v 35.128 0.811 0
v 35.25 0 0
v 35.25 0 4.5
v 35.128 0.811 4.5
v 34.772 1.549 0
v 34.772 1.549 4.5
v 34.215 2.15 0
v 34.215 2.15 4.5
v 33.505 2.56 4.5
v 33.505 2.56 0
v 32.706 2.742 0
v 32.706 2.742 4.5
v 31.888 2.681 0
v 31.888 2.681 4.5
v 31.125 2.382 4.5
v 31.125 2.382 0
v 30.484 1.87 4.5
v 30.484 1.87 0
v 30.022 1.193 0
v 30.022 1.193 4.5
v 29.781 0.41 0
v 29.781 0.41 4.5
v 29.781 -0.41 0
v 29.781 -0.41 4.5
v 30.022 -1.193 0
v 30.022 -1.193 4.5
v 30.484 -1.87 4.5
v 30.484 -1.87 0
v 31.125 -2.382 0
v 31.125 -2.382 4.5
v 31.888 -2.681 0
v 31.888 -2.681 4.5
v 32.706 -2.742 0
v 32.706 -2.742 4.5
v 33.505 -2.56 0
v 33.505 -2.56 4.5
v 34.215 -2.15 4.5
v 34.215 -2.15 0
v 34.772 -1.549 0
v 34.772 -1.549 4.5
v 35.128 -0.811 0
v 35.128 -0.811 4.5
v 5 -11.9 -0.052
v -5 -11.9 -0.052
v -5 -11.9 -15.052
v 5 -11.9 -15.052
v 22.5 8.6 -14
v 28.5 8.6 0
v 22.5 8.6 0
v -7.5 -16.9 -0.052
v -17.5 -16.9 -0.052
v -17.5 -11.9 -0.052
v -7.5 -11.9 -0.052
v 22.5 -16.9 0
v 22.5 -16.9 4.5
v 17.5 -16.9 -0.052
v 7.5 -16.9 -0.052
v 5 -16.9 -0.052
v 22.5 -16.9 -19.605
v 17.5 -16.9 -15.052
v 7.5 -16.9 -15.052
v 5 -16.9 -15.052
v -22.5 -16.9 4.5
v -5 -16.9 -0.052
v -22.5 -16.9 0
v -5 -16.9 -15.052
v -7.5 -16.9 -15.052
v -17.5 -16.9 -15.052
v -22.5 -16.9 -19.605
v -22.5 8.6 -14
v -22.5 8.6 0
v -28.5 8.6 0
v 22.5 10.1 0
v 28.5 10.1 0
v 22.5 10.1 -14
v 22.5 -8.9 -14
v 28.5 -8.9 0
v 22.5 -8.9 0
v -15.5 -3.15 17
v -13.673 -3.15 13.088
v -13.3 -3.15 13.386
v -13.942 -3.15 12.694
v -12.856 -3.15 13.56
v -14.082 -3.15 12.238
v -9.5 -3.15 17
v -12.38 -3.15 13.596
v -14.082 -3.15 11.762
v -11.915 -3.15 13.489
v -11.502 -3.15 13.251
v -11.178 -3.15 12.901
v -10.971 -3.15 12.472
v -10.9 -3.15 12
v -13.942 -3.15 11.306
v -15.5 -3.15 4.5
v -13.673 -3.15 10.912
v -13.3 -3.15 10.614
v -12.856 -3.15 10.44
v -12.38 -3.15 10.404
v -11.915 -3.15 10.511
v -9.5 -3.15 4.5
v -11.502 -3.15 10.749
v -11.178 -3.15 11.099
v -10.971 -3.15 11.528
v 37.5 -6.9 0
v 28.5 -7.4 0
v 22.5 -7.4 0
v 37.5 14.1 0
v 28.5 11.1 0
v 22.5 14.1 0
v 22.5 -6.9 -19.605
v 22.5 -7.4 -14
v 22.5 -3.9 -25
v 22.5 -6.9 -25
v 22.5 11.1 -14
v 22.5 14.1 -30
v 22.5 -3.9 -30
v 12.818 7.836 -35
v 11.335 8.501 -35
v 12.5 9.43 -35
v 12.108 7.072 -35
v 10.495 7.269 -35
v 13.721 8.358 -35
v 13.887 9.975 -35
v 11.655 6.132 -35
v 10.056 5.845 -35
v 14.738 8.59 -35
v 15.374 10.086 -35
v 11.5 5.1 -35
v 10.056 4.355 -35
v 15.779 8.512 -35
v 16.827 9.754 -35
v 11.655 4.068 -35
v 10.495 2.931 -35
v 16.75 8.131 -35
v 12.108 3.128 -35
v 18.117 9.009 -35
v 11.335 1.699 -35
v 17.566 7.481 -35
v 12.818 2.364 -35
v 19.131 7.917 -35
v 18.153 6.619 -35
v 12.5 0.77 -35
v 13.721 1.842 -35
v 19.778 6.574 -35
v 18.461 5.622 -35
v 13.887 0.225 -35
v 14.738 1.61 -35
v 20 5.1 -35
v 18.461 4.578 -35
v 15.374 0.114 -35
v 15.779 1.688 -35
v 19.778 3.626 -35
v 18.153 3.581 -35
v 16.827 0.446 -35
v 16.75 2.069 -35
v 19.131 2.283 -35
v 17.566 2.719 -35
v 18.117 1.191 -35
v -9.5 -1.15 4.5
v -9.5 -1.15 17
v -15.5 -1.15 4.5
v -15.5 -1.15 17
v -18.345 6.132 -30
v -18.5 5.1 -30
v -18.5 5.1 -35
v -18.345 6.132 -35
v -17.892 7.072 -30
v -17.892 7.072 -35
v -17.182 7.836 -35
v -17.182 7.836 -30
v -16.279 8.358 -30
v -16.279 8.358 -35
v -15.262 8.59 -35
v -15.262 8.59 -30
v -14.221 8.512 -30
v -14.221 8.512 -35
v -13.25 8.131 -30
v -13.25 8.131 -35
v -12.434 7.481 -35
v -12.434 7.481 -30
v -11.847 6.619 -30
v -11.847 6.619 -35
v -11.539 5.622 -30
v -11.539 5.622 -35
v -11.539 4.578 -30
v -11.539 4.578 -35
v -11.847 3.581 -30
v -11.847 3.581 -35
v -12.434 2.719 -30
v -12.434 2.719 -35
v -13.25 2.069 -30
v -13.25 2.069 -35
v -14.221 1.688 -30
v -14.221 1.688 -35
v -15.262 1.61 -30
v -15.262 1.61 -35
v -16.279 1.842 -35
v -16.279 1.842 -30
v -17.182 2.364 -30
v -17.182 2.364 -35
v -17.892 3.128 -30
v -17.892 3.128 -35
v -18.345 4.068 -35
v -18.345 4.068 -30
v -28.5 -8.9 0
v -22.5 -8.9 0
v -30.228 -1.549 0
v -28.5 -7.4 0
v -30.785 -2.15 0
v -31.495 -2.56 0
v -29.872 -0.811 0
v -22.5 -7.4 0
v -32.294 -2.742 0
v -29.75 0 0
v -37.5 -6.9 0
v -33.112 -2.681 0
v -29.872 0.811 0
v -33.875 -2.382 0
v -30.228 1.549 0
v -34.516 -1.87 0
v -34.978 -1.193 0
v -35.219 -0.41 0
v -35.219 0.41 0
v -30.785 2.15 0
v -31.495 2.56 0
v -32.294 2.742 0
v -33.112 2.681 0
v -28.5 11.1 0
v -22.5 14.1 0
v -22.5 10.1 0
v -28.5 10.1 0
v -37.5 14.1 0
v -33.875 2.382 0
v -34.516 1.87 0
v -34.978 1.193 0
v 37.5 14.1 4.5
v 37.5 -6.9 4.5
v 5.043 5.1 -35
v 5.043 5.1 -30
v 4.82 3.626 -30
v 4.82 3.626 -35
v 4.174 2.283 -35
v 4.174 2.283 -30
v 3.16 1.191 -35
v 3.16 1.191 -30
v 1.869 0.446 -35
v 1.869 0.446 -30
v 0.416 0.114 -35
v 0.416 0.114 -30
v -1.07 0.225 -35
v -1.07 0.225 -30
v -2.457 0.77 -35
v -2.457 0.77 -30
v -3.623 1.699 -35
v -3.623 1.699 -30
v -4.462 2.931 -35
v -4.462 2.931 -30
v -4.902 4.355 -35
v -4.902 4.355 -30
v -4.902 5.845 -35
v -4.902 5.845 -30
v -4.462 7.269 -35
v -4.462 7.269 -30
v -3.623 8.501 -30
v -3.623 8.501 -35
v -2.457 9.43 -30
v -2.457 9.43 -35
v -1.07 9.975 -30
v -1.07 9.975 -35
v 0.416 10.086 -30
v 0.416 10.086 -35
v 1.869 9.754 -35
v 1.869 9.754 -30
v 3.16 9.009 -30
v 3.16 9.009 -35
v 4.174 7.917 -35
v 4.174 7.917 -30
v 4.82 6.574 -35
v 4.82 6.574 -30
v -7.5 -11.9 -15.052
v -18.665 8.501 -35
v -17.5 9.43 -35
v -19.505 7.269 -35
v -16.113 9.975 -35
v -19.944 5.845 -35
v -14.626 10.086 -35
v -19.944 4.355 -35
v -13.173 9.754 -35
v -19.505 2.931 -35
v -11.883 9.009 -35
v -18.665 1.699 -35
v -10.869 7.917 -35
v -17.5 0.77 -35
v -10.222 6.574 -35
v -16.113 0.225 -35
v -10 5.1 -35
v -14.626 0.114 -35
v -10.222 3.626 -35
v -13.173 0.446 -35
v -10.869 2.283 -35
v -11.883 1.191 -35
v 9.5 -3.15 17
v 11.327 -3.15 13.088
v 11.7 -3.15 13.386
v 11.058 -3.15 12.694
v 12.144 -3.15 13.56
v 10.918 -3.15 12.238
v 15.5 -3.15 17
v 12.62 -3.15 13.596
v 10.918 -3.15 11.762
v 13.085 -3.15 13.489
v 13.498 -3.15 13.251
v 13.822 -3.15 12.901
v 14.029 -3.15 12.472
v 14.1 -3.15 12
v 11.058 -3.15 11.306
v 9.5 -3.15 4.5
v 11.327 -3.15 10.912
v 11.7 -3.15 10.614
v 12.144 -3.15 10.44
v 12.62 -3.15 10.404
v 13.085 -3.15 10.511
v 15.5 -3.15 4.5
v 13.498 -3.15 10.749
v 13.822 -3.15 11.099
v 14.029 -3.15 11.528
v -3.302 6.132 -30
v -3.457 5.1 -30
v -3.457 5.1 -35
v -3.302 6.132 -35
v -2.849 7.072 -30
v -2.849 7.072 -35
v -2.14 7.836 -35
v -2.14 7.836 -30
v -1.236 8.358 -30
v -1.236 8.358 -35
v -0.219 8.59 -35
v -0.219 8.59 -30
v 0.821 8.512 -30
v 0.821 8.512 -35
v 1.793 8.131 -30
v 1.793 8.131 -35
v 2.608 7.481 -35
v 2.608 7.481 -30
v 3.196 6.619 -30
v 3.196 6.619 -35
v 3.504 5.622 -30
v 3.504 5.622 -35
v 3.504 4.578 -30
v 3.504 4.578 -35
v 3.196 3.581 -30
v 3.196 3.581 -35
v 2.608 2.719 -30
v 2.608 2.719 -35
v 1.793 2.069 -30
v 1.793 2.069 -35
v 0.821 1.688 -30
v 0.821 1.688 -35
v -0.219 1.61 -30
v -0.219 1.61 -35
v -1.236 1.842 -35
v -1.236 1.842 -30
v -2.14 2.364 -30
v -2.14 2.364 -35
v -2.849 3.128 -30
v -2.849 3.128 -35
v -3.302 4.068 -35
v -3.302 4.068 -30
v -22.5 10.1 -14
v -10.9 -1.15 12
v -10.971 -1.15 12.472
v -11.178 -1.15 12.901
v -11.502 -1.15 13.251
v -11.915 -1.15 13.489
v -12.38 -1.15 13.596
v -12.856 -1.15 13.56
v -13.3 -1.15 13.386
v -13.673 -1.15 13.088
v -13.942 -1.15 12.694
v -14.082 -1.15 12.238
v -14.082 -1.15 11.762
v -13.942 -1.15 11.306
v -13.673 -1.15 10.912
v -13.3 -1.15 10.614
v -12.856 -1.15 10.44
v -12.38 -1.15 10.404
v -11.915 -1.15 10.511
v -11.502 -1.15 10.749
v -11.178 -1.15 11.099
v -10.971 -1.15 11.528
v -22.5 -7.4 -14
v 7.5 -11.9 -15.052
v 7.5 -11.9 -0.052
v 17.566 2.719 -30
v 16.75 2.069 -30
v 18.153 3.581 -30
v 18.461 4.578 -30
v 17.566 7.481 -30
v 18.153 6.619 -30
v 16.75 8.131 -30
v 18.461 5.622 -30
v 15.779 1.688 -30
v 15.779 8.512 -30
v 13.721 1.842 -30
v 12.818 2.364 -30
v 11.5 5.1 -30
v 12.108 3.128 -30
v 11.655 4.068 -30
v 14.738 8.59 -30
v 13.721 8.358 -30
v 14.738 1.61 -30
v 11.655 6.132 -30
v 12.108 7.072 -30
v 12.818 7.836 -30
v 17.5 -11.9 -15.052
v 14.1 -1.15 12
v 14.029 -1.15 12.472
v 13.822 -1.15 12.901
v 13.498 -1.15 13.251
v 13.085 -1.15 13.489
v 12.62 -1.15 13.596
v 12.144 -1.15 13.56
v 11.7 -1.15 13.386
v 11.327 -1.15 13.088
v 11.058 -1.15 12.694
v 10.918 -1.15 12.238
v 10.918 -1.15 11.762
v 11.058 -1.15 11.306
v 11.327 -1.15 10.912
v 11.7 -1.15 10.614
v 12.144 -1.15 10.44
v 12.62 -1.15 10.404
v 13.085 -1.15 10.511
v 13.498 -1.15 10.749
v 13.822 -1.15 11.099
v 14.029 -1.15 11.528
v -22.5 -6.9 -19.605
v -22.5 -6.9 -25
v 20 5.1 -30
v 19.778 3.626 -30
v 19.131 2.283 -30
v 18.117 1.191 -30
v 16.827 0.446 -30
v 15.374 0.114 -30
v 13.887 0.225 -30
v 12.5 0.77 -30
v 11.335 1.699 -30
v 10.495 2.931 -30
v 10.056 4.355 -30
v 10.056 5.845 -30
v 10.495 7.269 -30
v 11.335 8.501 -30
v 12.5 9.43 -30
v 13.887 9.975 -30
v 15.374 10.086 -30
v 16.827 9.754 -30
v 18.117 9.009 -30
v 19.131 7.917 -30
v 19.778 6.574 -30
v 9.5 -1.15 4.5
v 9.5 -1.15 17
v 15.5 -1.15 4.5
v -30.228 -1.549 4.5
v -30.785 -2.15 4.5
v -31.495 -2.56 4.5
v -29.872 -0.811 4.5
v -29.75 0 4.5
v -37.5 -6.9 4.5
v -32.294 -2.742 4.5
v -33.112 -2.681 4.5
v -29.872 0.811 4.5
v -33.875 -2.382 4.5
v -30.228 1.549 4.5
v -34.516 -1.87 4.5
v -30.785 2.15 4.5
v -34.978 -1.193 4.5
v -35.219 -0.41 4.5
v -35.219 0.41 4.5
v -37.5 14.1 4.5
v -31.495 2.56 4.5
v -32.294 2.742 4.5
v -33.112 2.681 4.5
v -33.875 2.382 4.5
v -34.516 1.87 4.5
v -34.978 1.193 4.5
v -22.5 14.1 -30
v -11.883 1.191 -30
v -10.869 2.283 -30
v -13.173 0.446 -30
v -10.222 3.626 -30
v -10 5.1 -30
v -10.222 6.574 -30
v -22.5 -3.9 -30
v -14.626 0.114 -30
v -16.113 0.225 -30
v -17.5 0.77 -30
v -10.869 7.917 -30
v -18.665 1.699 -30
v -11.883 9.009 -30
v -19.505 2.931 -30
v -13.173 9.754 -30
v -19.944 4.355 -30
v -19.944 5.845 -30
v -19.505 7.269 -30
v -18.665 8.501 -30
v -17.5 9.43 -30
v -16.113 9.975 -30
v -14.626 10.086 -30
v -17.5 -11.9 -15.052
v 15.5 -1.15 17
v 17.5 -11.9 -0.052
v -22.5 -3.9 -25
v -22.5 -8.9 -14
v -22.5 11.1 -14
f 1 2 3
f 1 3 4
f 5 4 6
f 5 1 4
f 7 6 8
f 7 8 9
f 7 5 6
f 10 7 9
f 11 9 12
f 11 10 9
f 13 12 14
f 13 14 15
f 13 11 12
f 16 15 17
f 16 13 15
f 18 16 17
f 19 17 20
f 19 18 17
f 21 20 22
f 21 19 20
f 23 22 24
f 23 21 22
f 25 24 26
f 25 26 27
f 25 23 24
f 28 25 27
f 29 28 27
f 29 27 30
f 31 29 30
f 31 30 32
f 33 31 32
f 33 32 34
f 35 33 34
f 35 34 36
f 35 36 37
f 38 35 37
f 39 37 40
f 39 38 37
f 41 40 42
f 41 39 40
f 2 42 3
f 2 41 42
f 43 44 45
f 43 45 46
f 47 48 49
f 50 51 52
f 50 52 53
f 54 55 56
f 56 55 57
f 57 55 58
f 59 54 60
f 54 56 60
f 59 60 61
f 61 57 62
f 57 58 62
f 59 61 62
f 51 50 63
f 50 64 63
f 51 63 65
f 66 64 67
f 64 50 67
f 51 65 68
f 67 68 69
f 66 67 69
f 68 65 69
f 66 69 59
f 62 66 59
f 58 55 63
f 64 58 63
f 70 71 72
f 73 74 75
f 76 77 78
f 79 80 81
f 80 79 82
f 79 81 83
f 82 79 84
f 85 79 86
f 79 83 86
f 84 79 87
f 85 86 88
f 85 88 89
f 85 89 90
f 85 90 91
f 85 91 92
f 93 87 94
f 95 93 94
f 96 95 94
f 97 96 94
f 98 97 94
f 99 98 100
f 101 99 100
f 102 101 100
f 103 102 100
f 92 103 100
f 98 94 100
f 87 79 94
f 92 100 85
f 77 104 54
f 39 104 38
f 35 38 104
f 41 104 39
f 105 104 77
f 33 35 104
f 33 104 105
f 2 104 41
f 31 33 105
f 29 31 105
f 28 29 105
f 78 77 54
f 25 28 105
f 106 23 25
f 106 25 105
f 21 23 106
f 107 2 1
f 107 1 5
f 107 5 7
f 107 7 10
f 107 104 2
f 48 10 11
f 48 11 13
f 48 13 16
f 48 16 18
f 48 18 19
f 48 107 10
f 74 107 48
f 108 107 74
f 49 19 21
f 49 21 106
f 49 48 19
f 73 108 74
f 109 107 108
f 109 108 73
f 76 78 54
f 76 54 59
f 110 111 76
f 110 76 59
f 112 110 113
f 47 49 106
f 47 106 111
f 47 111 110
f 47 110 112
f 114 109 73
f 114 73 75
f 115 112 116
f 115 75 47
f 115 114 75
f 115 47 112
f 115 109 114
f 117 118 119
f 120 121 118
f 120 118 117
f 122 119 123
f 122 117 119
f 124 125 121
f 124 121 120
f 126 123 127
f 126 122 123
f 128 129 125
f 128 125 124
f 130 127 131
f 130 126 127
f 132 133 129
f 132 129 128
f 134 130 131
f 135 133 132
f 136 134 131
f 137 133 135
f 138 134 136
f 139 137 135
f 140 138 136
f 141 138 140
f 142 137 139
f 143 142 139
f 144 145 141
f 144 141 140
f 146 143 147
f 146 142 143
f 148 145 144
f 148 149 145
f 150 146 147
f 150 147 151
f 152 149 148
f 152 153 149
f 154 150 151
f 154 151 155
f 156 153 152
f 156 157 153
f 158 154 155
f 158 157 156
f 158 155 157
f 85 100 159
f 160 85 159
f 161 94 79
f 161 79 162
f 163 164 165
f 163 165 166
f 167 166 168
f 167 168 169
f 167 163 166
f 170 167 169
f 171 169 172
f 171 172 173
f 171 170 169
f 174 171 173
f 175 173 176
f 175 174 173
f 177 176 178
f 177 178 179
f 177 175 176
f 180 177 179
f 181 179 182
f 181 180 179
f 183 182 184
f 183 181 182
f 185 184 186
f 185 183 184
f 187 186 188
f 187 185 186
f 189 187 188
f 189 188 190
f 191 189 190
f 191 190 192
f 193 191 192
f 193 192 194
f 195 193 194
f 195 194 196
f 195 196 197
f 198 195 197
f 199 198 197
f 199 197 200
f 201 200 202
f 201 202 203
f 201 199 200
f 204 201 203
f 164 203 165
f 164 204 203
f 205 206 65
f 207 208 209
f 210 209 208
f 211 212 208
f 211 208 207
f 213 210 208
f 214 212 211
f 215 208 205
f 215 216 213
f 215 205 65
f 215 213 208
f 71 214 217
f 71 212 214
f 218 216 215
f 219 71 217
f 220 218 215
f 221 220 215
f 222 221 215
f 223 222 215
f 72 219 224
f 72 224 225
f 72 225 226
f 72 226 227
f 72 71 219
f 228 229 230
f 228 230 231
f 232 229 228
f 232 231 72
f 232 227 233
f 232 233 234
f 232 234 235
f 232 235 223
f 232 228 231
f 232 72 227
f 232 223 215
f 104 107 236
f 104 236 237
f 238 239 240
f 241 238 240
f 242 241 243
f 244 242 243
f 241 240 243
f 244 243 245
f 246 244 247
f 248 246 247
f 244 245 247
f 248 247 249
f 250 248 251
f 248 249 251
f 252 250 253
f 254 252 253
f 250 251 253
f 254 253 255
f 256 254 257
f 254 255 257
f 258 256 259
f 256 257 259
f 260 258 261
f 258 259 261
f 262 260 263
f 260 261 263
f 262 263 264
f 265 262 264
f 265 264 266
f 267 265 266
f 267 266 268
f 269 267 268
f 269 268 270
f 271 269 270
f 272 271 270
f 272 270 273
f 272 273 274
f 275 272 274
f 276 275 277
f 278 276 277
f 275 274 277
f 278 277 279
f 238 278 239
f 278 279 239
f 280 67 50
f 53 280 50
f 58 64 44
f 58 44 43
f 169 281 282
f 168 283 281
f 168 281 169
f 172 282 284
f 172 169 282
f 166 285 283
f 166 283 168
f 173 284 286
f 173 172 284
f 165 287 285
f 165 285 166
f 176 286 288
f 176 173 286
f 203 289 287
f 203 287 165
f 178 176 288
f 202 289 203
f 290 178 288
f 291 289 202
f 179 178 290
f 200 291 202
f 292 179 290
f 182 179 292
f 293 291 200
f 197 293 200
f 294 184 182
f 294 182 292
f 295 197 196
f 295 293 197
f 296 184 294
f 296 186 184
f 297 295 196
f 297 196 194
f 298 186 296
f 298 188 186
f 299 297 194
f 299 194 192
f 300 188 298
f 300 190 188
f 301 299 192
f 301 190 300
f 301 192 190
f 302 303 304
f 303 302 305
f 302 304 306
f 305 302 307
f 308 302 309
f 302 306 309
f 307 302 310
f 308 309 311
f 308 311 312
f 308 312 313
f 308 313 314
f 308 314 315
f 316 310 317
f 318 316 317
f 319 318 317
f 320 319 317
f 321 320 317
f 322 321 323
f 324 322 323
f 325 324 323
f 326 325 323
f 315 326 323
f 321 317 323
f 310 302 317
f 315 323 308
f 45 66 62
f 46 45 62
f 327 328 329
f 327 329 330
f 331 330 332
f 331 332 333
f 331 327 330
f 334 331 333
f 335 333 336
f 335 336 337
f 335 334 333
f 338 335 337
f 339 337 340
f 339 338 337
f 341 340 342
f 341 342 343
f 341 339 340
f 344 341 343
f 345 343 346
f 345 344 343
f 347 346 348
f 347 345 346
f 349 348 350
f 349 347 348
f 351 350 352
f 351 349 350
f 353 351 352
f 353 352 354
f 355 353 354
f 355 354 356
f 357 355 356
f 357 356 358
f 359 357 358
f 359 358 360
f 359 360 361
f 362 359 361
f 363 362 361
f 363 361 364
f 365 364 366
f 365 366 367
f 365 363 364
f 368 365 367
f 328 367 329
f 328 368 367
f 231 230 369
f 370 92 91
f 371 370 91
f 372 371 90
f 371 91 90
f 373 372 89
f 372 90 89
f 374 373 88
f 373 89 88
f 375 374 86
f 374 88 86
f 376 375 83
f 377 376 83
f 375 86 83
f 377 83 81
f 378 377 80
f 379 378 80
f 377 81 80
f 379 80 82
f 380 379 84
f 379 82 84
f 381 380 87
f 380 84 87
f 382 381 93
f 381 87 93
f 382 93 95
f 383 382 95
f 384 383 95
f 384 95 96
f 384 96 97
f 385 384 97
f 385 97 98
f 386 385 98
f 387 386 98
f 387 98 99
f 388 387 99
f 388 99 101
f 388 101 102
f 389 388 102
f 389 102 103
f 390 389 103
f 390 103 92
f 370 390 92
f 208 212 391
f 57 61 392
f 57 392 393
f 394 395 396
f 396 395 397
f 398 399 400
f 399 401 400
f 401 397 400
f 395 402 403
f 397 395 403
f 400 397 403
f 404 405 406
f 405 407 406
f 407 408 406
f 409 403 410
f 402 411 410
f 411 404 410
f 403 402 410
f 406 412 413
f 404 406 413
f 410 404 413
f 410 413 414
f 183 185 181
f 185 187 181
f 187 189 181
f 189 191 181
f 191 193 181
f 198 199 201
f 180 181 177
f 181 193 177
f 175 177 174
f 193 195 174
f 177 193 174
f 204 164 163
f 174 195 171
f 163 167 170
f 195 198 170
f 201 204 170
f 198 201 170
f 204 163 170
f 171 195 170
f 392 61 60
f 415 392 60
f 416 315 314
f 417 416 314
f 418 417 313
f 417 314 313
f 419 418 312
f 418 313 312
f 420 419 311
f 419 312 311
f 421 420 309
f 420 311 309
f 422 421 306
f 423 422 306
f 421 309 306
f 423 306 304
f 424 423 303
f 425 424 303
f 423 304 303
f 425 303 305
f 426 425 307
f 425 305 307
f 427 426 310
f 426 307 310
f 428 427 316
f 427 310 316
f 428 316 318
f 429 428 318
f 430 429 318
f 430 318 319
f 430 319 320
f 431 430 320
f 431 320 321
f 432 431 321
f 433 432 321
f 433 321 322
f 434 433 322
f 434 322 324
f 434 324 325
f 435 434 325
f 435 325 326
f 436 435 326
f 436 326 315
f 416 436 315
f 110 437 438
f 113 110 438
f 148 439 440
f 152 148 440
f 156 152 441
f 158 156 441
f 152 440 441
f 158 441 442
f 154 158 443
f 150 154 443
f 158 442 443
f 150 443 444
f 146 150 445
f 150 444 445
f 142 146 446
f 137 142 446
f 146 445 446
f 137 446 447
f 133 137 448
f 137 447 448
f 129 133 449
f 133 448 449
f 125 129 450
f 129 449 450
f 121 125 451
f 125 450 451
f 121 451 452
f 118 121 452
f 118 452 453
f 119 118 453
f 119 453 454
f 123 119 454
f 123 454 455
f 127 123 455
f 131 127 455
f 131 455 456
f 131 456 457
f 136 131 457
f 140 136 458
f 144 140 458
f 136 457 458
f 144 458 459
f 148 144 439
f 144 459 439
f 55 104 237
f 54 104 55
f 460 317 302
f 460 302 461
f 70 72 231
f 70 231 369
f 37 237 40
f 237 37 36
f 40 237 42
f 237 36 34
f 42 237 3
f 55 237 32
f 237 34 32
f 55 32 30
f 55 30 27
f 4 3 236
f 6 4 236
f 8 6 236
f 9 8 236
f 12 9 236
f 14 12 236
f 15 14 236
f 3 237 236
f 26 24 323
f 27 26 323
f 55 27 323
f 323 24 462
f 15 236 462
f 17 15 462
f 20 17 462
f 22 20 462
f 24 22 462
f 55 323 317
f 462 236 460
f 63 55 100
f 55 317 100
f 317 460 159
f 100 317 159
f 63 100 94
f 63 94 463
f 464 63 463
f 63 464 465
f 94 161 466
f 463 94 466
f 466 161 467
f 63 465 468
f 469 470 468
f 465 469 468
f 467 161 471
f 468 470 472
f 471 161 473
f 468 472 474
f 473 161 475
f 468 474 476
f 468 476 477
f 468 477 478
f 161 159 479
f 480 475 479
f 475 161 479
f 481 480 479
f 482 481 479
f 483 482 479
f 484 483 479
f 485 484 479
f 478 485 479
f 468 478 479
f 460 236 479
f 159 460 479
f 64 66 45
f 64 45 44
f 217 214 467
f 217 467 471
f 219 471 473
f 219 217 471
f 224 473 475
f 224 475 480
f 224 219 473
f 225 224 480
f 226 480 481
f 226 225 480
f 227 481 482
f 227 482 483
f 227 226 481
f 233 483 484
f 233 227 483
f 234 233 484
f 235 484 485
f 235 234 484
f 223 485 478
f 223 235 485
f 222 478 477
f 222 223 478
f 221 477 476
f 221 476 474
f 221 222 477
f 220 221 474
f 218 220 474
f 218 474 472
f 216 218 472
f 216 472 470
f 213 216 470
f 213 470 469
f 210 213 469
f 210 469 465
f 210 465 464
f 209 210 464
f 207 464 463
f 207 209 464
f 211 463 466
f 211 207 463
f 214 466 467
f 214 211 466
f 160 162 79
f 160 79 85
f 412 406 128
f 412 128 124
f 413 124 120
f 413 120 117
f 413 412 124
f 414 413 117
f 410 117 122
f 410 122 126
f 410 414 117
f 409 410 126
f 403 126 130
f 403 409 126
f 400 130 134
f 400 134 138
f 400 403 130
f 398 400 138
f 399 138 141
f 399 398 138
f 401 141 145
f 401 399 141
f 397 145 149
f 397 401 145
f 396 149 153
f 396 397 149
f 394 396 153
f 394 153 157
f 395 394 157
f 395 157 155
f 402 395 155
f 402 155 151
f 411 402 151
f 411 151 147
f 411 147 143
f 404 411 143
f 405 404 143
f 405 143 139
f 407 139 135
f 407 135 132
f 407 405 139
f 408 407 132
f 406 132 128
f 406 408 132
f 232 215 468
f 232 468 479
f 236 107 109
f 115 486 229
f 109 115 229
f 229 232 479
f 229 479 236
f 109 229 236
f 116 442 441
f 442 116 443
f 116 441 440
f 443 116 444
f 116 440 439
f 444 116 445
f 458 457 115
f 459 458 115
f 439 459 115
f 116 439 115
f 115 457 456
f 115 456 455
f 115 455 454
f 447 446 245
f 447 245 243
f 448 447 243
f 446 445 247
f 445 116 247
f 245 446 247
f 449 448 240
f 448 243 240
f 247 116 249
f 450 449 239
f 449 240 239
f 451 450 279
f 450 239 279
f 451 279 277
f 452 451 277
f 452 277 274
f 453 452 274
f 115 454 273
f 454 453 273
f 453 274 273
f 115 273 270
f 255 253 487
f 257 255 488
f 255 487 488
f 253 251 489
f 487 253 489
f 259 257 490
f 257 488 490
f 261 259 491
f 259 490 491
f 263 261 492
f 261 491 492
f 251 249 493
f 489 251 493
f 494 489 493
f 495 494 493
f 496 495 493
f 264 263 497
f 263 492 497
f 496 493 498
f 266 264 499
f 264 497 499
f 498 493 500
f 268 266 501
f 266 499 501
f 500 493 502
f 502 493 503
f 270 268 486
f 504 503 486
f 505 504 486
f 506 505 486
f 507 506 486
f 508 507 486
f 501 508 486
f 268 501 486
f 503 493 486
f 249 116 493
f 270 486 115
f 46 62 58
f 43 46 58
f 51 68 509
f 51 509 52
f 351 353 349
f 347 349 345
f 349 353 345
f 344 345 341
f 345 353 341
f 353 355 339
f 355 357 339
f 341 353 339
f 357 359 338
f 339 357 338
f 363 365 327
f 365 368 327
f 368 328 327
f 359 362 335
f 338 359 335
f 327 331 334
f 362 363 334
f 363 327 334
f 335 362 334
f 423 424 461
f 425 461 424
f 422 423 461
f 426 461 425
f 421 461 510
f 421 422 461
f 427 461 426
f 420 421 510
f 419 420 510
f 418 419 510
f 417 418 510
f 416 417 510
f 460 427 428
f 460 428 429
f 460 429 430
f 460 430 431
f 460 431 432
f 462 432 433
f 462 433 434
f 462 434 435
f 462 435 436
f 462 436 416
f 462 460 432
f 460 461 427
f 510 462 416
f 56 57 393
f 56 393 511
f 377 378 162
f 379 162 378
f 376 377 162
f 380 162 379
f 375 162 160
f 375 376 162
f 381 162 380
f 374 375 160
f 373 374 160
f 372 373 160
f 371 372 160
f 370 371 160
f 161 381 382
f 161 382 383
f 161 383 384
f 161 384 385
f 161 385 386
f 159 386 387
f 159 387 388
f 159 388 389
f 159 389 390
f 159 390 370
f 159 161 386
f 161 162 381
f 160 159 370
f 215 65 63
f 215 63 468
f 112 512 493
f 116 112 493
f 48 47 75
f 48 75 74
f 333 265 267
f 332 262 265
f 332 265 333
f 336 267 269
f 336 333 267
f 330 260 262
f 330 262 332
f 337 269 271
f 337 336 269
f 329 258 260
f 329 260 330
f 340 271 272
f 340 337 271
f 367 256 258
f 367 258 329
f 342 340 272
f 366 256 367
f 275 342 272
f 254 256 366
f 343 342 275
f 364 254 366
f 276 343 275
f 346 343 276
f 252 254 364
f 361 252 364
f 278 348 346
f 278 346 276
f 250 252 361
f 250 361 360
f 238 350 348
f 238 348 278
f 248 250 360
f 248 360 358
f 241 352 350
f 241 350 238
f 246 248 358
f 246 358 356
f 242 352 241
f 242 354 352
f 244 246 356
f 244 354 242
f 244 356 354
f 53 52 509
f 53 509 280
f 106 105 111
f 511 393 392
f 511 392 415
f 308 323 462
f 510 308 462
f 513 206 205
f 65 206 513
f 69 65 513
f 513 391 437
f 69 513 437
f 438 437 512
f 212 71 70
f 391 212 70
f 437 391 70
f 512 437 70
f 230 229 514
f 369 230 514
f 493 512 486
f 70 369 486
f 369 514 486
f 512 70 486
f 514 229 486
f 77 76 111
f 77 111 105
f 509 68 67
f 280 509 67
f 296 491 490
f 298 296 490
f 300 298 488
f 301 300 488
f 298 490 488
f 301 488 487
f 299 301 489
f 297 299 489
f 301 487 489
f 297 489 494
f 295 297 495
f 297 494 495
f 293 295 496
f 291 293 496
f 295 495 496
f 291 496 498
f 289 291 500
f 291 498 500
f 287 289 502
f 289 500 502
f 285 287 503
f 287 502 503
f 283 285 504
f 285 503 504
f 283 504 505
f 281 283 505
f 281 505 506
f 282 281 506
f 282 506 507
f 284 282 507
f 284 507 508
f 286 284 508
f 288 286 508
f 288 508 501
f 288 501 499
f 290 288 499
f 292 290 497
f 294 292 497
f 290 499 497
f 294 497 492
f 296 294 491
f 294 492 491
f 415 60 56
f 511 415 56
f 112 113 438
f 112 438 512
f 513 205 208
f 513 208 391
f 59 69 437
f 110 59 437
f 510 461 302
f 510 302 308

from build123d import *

# Parameters (mm, degrees)
SKETCH_1_R           = 2.75
EXTRUDE_1_DEPTH      = 4.5
EXTRUDE_2_DEPTH      = 22.5
EXTRUDE_2_DEPTH_BACK = 22.5
SKETCH_3_R           = 5
SKETCH_3_R_2         = 3.5
EXTRUDE_3_DEPTH      = 5
SKETCH_4_W           = 10
SKETCH_4_H           = 15
CUT_EXTRUDE_1_DEPTH  = 5
SKETCH_5_W           = 6
SKETCH_5_H           = 2
EXTRUDE_4_DEPTH      = 12.5
SKETCH_6_W           = 6
SKETCH_6_H           = 1.5
EXTRUDE_5_DEPTH      = 14
CUT_EXTRUDE_2_DEPTH  = 20
SKETCH_8_R           = 1.6
CUT_EXTRUDE_3_DEPTH  = 10


with BuildPart() as part:
    # Эскиз1 → Вытянуть1 (new body)
    with BuildSketch(Plane.XY):
        Polygon((-22.5, -16.9), (-37.5, -6.9), (-37.5, 14.1), (37.5, 14.1), (37.5, -6.9), (22.5, -16.9), align=None)
        with Locations((-32.5, 0)):
            Circle(SKETCH_1_R, mode=Mode.SUBTRACT)
        with Locations((32.5, 0)):
            Circle(SKETCH_1_R, mode=Mode.SUBTRACT)
    extrude(amount=EXTRUDE_1_DEPTH)

    # Эскиз2 → Вытянуть2 (add, two sides: drawn at the far end of the back side and taken through both)
    with BuildSketch(Plane(origin=(0, 0, 0), x_dir=(0, 0, -1), z_dir=(1, 0, 0)).offset(-EXTRUDE_2_DEPTH_BACK)):
        Polygon((0, -16.9), (19.60451018, -16.9), (19.60451018, -6.9), (25, -6.9), (25, -3.9), (30, -3.9), (30, 14.1), (0, 14.1), align=None)
    extrude(amount=EXTRUDE_2_DEPTH + EXTRUDE_2_DEPTH_BACK)

    # Эскиз3 → Вытянуть3 (add)
    # profile 1 of 3: a face of its own
    with BuildSketch(Plane(origin=(0, 0, -30), x_dir=(-1, 0, 0), z_dir=(0, 0, -1))):
        with Locations(Location((-15, 5.1, 0), (0, 0, 180))):
            Circle(SKETCH_3_R)
        with Locations((-15, 5.1)):
            Circle(SKETCH_3_R_2, mode=Mode.SUBTRACT)
    # profile 2 of 3: a face of its own
    with BuildSketch(Plane(origin=(0, 0, -30), x_dir=(-1, 0, 0), z_dir=(0, 0, -1))):
        with Locations(Location((15, 5.1, 0), (0, 0, 180))):
            Circle(SKETCH_3_R)
        with Locations((15, 5.1)):
            Circle(SKETCH_3_R_2, mode=Mode.SUBTRACT)
    # profile 3 of 3: a face of its own
    with BuildSketch(Plane(origin=(0, 0, -30), x_dir=(-1, 0, 0), z_dir=(0, 0, -1))):
        with Locations(Location((-0.042603982, 5.1, 0), (0, 0, 180))):
            Circle(SKETCH_3_R)
        with Locations((-0.042603982, 5.1)):
            Circle(SKETCH_3_R_2, mode=Mode.SUBTRACT)
    extrude(amount=EXTRUDE_3_DEPTH)

    # Эскиз4 → Вырез-Вытянуть1 (cut)
    with BuildSketch(Plane.XZ.offset(16.9)):
        with Locations((0, -7.55225509)):
            Rectangle(SKETCH_4_W, SKETCH_4_H)
        with Locations((12.5, -7.55225509)):
            Rectangle(SKETCH_4_W, SKETCH_4_H)
        with Locations((-12.5, -7.55225509)):
            Rectangle(SKETCH_4_W, SKETCH_4_H)
    extrude(amount=-CUT_EXTRUDE_1_DEPTH, mode=Mode.SUBTRACT)

    # Эскиз5 → Вытянуть4 (add)
    with BuildSketch(Plane.XY.offset(4.5)):
        with Locations((-12.5, -2.15)):
            Rectangle(SKETCH_5_W, SKETCH_5_H)
        with Locations((12.5, -2.15)):
            Rectangle(SKETCH_5_W, SKETCH_5_H)
    extrude(amount=EXTRUDE_4_DEPTH)

    # Эскиз6 → Вытянуть5 (add)
    with BuildSketch(Plane(origin=(0, 0, 0), x_dir=(-1, 0, 0), z_dir=(0, 0, -1))):
        with Locations((-25.5, -8.15)):
            Rectangle(SKETCH_6_W, SKETCH_6_H)
        with Locations((-25.5, 9.35)):
            Rectangle(SKETCH_6_W, SKETCH_6_H)
        with Locations((25.5, 9.35)):
            Rectangle(SKETCH_6_W, SKETCH_6_H)
        with Locations((25.5, -8.15)):
            Rectangle(SKETCH_6_W, SKETCH_6_H)
    extrude(amount=EXTRUDE_5_DEPTH)

    # Эскиз7 → Вырез-Вытянуть2 (cut)
    with BuildSketch(Plane.XZ.offset(8.9)):
        Polygon((-22.5, -14), (-28.5, -14), (-28.5, 0), align=None)
        Polygon((22.5, -14), (28.5, 0), (28.5, -14), align=None)
    extrude(amount=-CUT_EXTRUDE_2_DEPTH, mode=Mode.SUBTRACT)

    # Эскиз8 → Вырез-Вытянуть3 (cut)
    with BuildSketch(Plane.XZ.offset(3.15)):
        with Locations((-12.5, 12)):
            Circle(SKETCH_8_R)
        with Locations((12.5, 12)):
            Circle(SKETCH_8_R)
    extrude(amount=-CUT_EXTRUDE_3_DEPTH, mode=Mode.SUBTRACT)


solid = part.part
